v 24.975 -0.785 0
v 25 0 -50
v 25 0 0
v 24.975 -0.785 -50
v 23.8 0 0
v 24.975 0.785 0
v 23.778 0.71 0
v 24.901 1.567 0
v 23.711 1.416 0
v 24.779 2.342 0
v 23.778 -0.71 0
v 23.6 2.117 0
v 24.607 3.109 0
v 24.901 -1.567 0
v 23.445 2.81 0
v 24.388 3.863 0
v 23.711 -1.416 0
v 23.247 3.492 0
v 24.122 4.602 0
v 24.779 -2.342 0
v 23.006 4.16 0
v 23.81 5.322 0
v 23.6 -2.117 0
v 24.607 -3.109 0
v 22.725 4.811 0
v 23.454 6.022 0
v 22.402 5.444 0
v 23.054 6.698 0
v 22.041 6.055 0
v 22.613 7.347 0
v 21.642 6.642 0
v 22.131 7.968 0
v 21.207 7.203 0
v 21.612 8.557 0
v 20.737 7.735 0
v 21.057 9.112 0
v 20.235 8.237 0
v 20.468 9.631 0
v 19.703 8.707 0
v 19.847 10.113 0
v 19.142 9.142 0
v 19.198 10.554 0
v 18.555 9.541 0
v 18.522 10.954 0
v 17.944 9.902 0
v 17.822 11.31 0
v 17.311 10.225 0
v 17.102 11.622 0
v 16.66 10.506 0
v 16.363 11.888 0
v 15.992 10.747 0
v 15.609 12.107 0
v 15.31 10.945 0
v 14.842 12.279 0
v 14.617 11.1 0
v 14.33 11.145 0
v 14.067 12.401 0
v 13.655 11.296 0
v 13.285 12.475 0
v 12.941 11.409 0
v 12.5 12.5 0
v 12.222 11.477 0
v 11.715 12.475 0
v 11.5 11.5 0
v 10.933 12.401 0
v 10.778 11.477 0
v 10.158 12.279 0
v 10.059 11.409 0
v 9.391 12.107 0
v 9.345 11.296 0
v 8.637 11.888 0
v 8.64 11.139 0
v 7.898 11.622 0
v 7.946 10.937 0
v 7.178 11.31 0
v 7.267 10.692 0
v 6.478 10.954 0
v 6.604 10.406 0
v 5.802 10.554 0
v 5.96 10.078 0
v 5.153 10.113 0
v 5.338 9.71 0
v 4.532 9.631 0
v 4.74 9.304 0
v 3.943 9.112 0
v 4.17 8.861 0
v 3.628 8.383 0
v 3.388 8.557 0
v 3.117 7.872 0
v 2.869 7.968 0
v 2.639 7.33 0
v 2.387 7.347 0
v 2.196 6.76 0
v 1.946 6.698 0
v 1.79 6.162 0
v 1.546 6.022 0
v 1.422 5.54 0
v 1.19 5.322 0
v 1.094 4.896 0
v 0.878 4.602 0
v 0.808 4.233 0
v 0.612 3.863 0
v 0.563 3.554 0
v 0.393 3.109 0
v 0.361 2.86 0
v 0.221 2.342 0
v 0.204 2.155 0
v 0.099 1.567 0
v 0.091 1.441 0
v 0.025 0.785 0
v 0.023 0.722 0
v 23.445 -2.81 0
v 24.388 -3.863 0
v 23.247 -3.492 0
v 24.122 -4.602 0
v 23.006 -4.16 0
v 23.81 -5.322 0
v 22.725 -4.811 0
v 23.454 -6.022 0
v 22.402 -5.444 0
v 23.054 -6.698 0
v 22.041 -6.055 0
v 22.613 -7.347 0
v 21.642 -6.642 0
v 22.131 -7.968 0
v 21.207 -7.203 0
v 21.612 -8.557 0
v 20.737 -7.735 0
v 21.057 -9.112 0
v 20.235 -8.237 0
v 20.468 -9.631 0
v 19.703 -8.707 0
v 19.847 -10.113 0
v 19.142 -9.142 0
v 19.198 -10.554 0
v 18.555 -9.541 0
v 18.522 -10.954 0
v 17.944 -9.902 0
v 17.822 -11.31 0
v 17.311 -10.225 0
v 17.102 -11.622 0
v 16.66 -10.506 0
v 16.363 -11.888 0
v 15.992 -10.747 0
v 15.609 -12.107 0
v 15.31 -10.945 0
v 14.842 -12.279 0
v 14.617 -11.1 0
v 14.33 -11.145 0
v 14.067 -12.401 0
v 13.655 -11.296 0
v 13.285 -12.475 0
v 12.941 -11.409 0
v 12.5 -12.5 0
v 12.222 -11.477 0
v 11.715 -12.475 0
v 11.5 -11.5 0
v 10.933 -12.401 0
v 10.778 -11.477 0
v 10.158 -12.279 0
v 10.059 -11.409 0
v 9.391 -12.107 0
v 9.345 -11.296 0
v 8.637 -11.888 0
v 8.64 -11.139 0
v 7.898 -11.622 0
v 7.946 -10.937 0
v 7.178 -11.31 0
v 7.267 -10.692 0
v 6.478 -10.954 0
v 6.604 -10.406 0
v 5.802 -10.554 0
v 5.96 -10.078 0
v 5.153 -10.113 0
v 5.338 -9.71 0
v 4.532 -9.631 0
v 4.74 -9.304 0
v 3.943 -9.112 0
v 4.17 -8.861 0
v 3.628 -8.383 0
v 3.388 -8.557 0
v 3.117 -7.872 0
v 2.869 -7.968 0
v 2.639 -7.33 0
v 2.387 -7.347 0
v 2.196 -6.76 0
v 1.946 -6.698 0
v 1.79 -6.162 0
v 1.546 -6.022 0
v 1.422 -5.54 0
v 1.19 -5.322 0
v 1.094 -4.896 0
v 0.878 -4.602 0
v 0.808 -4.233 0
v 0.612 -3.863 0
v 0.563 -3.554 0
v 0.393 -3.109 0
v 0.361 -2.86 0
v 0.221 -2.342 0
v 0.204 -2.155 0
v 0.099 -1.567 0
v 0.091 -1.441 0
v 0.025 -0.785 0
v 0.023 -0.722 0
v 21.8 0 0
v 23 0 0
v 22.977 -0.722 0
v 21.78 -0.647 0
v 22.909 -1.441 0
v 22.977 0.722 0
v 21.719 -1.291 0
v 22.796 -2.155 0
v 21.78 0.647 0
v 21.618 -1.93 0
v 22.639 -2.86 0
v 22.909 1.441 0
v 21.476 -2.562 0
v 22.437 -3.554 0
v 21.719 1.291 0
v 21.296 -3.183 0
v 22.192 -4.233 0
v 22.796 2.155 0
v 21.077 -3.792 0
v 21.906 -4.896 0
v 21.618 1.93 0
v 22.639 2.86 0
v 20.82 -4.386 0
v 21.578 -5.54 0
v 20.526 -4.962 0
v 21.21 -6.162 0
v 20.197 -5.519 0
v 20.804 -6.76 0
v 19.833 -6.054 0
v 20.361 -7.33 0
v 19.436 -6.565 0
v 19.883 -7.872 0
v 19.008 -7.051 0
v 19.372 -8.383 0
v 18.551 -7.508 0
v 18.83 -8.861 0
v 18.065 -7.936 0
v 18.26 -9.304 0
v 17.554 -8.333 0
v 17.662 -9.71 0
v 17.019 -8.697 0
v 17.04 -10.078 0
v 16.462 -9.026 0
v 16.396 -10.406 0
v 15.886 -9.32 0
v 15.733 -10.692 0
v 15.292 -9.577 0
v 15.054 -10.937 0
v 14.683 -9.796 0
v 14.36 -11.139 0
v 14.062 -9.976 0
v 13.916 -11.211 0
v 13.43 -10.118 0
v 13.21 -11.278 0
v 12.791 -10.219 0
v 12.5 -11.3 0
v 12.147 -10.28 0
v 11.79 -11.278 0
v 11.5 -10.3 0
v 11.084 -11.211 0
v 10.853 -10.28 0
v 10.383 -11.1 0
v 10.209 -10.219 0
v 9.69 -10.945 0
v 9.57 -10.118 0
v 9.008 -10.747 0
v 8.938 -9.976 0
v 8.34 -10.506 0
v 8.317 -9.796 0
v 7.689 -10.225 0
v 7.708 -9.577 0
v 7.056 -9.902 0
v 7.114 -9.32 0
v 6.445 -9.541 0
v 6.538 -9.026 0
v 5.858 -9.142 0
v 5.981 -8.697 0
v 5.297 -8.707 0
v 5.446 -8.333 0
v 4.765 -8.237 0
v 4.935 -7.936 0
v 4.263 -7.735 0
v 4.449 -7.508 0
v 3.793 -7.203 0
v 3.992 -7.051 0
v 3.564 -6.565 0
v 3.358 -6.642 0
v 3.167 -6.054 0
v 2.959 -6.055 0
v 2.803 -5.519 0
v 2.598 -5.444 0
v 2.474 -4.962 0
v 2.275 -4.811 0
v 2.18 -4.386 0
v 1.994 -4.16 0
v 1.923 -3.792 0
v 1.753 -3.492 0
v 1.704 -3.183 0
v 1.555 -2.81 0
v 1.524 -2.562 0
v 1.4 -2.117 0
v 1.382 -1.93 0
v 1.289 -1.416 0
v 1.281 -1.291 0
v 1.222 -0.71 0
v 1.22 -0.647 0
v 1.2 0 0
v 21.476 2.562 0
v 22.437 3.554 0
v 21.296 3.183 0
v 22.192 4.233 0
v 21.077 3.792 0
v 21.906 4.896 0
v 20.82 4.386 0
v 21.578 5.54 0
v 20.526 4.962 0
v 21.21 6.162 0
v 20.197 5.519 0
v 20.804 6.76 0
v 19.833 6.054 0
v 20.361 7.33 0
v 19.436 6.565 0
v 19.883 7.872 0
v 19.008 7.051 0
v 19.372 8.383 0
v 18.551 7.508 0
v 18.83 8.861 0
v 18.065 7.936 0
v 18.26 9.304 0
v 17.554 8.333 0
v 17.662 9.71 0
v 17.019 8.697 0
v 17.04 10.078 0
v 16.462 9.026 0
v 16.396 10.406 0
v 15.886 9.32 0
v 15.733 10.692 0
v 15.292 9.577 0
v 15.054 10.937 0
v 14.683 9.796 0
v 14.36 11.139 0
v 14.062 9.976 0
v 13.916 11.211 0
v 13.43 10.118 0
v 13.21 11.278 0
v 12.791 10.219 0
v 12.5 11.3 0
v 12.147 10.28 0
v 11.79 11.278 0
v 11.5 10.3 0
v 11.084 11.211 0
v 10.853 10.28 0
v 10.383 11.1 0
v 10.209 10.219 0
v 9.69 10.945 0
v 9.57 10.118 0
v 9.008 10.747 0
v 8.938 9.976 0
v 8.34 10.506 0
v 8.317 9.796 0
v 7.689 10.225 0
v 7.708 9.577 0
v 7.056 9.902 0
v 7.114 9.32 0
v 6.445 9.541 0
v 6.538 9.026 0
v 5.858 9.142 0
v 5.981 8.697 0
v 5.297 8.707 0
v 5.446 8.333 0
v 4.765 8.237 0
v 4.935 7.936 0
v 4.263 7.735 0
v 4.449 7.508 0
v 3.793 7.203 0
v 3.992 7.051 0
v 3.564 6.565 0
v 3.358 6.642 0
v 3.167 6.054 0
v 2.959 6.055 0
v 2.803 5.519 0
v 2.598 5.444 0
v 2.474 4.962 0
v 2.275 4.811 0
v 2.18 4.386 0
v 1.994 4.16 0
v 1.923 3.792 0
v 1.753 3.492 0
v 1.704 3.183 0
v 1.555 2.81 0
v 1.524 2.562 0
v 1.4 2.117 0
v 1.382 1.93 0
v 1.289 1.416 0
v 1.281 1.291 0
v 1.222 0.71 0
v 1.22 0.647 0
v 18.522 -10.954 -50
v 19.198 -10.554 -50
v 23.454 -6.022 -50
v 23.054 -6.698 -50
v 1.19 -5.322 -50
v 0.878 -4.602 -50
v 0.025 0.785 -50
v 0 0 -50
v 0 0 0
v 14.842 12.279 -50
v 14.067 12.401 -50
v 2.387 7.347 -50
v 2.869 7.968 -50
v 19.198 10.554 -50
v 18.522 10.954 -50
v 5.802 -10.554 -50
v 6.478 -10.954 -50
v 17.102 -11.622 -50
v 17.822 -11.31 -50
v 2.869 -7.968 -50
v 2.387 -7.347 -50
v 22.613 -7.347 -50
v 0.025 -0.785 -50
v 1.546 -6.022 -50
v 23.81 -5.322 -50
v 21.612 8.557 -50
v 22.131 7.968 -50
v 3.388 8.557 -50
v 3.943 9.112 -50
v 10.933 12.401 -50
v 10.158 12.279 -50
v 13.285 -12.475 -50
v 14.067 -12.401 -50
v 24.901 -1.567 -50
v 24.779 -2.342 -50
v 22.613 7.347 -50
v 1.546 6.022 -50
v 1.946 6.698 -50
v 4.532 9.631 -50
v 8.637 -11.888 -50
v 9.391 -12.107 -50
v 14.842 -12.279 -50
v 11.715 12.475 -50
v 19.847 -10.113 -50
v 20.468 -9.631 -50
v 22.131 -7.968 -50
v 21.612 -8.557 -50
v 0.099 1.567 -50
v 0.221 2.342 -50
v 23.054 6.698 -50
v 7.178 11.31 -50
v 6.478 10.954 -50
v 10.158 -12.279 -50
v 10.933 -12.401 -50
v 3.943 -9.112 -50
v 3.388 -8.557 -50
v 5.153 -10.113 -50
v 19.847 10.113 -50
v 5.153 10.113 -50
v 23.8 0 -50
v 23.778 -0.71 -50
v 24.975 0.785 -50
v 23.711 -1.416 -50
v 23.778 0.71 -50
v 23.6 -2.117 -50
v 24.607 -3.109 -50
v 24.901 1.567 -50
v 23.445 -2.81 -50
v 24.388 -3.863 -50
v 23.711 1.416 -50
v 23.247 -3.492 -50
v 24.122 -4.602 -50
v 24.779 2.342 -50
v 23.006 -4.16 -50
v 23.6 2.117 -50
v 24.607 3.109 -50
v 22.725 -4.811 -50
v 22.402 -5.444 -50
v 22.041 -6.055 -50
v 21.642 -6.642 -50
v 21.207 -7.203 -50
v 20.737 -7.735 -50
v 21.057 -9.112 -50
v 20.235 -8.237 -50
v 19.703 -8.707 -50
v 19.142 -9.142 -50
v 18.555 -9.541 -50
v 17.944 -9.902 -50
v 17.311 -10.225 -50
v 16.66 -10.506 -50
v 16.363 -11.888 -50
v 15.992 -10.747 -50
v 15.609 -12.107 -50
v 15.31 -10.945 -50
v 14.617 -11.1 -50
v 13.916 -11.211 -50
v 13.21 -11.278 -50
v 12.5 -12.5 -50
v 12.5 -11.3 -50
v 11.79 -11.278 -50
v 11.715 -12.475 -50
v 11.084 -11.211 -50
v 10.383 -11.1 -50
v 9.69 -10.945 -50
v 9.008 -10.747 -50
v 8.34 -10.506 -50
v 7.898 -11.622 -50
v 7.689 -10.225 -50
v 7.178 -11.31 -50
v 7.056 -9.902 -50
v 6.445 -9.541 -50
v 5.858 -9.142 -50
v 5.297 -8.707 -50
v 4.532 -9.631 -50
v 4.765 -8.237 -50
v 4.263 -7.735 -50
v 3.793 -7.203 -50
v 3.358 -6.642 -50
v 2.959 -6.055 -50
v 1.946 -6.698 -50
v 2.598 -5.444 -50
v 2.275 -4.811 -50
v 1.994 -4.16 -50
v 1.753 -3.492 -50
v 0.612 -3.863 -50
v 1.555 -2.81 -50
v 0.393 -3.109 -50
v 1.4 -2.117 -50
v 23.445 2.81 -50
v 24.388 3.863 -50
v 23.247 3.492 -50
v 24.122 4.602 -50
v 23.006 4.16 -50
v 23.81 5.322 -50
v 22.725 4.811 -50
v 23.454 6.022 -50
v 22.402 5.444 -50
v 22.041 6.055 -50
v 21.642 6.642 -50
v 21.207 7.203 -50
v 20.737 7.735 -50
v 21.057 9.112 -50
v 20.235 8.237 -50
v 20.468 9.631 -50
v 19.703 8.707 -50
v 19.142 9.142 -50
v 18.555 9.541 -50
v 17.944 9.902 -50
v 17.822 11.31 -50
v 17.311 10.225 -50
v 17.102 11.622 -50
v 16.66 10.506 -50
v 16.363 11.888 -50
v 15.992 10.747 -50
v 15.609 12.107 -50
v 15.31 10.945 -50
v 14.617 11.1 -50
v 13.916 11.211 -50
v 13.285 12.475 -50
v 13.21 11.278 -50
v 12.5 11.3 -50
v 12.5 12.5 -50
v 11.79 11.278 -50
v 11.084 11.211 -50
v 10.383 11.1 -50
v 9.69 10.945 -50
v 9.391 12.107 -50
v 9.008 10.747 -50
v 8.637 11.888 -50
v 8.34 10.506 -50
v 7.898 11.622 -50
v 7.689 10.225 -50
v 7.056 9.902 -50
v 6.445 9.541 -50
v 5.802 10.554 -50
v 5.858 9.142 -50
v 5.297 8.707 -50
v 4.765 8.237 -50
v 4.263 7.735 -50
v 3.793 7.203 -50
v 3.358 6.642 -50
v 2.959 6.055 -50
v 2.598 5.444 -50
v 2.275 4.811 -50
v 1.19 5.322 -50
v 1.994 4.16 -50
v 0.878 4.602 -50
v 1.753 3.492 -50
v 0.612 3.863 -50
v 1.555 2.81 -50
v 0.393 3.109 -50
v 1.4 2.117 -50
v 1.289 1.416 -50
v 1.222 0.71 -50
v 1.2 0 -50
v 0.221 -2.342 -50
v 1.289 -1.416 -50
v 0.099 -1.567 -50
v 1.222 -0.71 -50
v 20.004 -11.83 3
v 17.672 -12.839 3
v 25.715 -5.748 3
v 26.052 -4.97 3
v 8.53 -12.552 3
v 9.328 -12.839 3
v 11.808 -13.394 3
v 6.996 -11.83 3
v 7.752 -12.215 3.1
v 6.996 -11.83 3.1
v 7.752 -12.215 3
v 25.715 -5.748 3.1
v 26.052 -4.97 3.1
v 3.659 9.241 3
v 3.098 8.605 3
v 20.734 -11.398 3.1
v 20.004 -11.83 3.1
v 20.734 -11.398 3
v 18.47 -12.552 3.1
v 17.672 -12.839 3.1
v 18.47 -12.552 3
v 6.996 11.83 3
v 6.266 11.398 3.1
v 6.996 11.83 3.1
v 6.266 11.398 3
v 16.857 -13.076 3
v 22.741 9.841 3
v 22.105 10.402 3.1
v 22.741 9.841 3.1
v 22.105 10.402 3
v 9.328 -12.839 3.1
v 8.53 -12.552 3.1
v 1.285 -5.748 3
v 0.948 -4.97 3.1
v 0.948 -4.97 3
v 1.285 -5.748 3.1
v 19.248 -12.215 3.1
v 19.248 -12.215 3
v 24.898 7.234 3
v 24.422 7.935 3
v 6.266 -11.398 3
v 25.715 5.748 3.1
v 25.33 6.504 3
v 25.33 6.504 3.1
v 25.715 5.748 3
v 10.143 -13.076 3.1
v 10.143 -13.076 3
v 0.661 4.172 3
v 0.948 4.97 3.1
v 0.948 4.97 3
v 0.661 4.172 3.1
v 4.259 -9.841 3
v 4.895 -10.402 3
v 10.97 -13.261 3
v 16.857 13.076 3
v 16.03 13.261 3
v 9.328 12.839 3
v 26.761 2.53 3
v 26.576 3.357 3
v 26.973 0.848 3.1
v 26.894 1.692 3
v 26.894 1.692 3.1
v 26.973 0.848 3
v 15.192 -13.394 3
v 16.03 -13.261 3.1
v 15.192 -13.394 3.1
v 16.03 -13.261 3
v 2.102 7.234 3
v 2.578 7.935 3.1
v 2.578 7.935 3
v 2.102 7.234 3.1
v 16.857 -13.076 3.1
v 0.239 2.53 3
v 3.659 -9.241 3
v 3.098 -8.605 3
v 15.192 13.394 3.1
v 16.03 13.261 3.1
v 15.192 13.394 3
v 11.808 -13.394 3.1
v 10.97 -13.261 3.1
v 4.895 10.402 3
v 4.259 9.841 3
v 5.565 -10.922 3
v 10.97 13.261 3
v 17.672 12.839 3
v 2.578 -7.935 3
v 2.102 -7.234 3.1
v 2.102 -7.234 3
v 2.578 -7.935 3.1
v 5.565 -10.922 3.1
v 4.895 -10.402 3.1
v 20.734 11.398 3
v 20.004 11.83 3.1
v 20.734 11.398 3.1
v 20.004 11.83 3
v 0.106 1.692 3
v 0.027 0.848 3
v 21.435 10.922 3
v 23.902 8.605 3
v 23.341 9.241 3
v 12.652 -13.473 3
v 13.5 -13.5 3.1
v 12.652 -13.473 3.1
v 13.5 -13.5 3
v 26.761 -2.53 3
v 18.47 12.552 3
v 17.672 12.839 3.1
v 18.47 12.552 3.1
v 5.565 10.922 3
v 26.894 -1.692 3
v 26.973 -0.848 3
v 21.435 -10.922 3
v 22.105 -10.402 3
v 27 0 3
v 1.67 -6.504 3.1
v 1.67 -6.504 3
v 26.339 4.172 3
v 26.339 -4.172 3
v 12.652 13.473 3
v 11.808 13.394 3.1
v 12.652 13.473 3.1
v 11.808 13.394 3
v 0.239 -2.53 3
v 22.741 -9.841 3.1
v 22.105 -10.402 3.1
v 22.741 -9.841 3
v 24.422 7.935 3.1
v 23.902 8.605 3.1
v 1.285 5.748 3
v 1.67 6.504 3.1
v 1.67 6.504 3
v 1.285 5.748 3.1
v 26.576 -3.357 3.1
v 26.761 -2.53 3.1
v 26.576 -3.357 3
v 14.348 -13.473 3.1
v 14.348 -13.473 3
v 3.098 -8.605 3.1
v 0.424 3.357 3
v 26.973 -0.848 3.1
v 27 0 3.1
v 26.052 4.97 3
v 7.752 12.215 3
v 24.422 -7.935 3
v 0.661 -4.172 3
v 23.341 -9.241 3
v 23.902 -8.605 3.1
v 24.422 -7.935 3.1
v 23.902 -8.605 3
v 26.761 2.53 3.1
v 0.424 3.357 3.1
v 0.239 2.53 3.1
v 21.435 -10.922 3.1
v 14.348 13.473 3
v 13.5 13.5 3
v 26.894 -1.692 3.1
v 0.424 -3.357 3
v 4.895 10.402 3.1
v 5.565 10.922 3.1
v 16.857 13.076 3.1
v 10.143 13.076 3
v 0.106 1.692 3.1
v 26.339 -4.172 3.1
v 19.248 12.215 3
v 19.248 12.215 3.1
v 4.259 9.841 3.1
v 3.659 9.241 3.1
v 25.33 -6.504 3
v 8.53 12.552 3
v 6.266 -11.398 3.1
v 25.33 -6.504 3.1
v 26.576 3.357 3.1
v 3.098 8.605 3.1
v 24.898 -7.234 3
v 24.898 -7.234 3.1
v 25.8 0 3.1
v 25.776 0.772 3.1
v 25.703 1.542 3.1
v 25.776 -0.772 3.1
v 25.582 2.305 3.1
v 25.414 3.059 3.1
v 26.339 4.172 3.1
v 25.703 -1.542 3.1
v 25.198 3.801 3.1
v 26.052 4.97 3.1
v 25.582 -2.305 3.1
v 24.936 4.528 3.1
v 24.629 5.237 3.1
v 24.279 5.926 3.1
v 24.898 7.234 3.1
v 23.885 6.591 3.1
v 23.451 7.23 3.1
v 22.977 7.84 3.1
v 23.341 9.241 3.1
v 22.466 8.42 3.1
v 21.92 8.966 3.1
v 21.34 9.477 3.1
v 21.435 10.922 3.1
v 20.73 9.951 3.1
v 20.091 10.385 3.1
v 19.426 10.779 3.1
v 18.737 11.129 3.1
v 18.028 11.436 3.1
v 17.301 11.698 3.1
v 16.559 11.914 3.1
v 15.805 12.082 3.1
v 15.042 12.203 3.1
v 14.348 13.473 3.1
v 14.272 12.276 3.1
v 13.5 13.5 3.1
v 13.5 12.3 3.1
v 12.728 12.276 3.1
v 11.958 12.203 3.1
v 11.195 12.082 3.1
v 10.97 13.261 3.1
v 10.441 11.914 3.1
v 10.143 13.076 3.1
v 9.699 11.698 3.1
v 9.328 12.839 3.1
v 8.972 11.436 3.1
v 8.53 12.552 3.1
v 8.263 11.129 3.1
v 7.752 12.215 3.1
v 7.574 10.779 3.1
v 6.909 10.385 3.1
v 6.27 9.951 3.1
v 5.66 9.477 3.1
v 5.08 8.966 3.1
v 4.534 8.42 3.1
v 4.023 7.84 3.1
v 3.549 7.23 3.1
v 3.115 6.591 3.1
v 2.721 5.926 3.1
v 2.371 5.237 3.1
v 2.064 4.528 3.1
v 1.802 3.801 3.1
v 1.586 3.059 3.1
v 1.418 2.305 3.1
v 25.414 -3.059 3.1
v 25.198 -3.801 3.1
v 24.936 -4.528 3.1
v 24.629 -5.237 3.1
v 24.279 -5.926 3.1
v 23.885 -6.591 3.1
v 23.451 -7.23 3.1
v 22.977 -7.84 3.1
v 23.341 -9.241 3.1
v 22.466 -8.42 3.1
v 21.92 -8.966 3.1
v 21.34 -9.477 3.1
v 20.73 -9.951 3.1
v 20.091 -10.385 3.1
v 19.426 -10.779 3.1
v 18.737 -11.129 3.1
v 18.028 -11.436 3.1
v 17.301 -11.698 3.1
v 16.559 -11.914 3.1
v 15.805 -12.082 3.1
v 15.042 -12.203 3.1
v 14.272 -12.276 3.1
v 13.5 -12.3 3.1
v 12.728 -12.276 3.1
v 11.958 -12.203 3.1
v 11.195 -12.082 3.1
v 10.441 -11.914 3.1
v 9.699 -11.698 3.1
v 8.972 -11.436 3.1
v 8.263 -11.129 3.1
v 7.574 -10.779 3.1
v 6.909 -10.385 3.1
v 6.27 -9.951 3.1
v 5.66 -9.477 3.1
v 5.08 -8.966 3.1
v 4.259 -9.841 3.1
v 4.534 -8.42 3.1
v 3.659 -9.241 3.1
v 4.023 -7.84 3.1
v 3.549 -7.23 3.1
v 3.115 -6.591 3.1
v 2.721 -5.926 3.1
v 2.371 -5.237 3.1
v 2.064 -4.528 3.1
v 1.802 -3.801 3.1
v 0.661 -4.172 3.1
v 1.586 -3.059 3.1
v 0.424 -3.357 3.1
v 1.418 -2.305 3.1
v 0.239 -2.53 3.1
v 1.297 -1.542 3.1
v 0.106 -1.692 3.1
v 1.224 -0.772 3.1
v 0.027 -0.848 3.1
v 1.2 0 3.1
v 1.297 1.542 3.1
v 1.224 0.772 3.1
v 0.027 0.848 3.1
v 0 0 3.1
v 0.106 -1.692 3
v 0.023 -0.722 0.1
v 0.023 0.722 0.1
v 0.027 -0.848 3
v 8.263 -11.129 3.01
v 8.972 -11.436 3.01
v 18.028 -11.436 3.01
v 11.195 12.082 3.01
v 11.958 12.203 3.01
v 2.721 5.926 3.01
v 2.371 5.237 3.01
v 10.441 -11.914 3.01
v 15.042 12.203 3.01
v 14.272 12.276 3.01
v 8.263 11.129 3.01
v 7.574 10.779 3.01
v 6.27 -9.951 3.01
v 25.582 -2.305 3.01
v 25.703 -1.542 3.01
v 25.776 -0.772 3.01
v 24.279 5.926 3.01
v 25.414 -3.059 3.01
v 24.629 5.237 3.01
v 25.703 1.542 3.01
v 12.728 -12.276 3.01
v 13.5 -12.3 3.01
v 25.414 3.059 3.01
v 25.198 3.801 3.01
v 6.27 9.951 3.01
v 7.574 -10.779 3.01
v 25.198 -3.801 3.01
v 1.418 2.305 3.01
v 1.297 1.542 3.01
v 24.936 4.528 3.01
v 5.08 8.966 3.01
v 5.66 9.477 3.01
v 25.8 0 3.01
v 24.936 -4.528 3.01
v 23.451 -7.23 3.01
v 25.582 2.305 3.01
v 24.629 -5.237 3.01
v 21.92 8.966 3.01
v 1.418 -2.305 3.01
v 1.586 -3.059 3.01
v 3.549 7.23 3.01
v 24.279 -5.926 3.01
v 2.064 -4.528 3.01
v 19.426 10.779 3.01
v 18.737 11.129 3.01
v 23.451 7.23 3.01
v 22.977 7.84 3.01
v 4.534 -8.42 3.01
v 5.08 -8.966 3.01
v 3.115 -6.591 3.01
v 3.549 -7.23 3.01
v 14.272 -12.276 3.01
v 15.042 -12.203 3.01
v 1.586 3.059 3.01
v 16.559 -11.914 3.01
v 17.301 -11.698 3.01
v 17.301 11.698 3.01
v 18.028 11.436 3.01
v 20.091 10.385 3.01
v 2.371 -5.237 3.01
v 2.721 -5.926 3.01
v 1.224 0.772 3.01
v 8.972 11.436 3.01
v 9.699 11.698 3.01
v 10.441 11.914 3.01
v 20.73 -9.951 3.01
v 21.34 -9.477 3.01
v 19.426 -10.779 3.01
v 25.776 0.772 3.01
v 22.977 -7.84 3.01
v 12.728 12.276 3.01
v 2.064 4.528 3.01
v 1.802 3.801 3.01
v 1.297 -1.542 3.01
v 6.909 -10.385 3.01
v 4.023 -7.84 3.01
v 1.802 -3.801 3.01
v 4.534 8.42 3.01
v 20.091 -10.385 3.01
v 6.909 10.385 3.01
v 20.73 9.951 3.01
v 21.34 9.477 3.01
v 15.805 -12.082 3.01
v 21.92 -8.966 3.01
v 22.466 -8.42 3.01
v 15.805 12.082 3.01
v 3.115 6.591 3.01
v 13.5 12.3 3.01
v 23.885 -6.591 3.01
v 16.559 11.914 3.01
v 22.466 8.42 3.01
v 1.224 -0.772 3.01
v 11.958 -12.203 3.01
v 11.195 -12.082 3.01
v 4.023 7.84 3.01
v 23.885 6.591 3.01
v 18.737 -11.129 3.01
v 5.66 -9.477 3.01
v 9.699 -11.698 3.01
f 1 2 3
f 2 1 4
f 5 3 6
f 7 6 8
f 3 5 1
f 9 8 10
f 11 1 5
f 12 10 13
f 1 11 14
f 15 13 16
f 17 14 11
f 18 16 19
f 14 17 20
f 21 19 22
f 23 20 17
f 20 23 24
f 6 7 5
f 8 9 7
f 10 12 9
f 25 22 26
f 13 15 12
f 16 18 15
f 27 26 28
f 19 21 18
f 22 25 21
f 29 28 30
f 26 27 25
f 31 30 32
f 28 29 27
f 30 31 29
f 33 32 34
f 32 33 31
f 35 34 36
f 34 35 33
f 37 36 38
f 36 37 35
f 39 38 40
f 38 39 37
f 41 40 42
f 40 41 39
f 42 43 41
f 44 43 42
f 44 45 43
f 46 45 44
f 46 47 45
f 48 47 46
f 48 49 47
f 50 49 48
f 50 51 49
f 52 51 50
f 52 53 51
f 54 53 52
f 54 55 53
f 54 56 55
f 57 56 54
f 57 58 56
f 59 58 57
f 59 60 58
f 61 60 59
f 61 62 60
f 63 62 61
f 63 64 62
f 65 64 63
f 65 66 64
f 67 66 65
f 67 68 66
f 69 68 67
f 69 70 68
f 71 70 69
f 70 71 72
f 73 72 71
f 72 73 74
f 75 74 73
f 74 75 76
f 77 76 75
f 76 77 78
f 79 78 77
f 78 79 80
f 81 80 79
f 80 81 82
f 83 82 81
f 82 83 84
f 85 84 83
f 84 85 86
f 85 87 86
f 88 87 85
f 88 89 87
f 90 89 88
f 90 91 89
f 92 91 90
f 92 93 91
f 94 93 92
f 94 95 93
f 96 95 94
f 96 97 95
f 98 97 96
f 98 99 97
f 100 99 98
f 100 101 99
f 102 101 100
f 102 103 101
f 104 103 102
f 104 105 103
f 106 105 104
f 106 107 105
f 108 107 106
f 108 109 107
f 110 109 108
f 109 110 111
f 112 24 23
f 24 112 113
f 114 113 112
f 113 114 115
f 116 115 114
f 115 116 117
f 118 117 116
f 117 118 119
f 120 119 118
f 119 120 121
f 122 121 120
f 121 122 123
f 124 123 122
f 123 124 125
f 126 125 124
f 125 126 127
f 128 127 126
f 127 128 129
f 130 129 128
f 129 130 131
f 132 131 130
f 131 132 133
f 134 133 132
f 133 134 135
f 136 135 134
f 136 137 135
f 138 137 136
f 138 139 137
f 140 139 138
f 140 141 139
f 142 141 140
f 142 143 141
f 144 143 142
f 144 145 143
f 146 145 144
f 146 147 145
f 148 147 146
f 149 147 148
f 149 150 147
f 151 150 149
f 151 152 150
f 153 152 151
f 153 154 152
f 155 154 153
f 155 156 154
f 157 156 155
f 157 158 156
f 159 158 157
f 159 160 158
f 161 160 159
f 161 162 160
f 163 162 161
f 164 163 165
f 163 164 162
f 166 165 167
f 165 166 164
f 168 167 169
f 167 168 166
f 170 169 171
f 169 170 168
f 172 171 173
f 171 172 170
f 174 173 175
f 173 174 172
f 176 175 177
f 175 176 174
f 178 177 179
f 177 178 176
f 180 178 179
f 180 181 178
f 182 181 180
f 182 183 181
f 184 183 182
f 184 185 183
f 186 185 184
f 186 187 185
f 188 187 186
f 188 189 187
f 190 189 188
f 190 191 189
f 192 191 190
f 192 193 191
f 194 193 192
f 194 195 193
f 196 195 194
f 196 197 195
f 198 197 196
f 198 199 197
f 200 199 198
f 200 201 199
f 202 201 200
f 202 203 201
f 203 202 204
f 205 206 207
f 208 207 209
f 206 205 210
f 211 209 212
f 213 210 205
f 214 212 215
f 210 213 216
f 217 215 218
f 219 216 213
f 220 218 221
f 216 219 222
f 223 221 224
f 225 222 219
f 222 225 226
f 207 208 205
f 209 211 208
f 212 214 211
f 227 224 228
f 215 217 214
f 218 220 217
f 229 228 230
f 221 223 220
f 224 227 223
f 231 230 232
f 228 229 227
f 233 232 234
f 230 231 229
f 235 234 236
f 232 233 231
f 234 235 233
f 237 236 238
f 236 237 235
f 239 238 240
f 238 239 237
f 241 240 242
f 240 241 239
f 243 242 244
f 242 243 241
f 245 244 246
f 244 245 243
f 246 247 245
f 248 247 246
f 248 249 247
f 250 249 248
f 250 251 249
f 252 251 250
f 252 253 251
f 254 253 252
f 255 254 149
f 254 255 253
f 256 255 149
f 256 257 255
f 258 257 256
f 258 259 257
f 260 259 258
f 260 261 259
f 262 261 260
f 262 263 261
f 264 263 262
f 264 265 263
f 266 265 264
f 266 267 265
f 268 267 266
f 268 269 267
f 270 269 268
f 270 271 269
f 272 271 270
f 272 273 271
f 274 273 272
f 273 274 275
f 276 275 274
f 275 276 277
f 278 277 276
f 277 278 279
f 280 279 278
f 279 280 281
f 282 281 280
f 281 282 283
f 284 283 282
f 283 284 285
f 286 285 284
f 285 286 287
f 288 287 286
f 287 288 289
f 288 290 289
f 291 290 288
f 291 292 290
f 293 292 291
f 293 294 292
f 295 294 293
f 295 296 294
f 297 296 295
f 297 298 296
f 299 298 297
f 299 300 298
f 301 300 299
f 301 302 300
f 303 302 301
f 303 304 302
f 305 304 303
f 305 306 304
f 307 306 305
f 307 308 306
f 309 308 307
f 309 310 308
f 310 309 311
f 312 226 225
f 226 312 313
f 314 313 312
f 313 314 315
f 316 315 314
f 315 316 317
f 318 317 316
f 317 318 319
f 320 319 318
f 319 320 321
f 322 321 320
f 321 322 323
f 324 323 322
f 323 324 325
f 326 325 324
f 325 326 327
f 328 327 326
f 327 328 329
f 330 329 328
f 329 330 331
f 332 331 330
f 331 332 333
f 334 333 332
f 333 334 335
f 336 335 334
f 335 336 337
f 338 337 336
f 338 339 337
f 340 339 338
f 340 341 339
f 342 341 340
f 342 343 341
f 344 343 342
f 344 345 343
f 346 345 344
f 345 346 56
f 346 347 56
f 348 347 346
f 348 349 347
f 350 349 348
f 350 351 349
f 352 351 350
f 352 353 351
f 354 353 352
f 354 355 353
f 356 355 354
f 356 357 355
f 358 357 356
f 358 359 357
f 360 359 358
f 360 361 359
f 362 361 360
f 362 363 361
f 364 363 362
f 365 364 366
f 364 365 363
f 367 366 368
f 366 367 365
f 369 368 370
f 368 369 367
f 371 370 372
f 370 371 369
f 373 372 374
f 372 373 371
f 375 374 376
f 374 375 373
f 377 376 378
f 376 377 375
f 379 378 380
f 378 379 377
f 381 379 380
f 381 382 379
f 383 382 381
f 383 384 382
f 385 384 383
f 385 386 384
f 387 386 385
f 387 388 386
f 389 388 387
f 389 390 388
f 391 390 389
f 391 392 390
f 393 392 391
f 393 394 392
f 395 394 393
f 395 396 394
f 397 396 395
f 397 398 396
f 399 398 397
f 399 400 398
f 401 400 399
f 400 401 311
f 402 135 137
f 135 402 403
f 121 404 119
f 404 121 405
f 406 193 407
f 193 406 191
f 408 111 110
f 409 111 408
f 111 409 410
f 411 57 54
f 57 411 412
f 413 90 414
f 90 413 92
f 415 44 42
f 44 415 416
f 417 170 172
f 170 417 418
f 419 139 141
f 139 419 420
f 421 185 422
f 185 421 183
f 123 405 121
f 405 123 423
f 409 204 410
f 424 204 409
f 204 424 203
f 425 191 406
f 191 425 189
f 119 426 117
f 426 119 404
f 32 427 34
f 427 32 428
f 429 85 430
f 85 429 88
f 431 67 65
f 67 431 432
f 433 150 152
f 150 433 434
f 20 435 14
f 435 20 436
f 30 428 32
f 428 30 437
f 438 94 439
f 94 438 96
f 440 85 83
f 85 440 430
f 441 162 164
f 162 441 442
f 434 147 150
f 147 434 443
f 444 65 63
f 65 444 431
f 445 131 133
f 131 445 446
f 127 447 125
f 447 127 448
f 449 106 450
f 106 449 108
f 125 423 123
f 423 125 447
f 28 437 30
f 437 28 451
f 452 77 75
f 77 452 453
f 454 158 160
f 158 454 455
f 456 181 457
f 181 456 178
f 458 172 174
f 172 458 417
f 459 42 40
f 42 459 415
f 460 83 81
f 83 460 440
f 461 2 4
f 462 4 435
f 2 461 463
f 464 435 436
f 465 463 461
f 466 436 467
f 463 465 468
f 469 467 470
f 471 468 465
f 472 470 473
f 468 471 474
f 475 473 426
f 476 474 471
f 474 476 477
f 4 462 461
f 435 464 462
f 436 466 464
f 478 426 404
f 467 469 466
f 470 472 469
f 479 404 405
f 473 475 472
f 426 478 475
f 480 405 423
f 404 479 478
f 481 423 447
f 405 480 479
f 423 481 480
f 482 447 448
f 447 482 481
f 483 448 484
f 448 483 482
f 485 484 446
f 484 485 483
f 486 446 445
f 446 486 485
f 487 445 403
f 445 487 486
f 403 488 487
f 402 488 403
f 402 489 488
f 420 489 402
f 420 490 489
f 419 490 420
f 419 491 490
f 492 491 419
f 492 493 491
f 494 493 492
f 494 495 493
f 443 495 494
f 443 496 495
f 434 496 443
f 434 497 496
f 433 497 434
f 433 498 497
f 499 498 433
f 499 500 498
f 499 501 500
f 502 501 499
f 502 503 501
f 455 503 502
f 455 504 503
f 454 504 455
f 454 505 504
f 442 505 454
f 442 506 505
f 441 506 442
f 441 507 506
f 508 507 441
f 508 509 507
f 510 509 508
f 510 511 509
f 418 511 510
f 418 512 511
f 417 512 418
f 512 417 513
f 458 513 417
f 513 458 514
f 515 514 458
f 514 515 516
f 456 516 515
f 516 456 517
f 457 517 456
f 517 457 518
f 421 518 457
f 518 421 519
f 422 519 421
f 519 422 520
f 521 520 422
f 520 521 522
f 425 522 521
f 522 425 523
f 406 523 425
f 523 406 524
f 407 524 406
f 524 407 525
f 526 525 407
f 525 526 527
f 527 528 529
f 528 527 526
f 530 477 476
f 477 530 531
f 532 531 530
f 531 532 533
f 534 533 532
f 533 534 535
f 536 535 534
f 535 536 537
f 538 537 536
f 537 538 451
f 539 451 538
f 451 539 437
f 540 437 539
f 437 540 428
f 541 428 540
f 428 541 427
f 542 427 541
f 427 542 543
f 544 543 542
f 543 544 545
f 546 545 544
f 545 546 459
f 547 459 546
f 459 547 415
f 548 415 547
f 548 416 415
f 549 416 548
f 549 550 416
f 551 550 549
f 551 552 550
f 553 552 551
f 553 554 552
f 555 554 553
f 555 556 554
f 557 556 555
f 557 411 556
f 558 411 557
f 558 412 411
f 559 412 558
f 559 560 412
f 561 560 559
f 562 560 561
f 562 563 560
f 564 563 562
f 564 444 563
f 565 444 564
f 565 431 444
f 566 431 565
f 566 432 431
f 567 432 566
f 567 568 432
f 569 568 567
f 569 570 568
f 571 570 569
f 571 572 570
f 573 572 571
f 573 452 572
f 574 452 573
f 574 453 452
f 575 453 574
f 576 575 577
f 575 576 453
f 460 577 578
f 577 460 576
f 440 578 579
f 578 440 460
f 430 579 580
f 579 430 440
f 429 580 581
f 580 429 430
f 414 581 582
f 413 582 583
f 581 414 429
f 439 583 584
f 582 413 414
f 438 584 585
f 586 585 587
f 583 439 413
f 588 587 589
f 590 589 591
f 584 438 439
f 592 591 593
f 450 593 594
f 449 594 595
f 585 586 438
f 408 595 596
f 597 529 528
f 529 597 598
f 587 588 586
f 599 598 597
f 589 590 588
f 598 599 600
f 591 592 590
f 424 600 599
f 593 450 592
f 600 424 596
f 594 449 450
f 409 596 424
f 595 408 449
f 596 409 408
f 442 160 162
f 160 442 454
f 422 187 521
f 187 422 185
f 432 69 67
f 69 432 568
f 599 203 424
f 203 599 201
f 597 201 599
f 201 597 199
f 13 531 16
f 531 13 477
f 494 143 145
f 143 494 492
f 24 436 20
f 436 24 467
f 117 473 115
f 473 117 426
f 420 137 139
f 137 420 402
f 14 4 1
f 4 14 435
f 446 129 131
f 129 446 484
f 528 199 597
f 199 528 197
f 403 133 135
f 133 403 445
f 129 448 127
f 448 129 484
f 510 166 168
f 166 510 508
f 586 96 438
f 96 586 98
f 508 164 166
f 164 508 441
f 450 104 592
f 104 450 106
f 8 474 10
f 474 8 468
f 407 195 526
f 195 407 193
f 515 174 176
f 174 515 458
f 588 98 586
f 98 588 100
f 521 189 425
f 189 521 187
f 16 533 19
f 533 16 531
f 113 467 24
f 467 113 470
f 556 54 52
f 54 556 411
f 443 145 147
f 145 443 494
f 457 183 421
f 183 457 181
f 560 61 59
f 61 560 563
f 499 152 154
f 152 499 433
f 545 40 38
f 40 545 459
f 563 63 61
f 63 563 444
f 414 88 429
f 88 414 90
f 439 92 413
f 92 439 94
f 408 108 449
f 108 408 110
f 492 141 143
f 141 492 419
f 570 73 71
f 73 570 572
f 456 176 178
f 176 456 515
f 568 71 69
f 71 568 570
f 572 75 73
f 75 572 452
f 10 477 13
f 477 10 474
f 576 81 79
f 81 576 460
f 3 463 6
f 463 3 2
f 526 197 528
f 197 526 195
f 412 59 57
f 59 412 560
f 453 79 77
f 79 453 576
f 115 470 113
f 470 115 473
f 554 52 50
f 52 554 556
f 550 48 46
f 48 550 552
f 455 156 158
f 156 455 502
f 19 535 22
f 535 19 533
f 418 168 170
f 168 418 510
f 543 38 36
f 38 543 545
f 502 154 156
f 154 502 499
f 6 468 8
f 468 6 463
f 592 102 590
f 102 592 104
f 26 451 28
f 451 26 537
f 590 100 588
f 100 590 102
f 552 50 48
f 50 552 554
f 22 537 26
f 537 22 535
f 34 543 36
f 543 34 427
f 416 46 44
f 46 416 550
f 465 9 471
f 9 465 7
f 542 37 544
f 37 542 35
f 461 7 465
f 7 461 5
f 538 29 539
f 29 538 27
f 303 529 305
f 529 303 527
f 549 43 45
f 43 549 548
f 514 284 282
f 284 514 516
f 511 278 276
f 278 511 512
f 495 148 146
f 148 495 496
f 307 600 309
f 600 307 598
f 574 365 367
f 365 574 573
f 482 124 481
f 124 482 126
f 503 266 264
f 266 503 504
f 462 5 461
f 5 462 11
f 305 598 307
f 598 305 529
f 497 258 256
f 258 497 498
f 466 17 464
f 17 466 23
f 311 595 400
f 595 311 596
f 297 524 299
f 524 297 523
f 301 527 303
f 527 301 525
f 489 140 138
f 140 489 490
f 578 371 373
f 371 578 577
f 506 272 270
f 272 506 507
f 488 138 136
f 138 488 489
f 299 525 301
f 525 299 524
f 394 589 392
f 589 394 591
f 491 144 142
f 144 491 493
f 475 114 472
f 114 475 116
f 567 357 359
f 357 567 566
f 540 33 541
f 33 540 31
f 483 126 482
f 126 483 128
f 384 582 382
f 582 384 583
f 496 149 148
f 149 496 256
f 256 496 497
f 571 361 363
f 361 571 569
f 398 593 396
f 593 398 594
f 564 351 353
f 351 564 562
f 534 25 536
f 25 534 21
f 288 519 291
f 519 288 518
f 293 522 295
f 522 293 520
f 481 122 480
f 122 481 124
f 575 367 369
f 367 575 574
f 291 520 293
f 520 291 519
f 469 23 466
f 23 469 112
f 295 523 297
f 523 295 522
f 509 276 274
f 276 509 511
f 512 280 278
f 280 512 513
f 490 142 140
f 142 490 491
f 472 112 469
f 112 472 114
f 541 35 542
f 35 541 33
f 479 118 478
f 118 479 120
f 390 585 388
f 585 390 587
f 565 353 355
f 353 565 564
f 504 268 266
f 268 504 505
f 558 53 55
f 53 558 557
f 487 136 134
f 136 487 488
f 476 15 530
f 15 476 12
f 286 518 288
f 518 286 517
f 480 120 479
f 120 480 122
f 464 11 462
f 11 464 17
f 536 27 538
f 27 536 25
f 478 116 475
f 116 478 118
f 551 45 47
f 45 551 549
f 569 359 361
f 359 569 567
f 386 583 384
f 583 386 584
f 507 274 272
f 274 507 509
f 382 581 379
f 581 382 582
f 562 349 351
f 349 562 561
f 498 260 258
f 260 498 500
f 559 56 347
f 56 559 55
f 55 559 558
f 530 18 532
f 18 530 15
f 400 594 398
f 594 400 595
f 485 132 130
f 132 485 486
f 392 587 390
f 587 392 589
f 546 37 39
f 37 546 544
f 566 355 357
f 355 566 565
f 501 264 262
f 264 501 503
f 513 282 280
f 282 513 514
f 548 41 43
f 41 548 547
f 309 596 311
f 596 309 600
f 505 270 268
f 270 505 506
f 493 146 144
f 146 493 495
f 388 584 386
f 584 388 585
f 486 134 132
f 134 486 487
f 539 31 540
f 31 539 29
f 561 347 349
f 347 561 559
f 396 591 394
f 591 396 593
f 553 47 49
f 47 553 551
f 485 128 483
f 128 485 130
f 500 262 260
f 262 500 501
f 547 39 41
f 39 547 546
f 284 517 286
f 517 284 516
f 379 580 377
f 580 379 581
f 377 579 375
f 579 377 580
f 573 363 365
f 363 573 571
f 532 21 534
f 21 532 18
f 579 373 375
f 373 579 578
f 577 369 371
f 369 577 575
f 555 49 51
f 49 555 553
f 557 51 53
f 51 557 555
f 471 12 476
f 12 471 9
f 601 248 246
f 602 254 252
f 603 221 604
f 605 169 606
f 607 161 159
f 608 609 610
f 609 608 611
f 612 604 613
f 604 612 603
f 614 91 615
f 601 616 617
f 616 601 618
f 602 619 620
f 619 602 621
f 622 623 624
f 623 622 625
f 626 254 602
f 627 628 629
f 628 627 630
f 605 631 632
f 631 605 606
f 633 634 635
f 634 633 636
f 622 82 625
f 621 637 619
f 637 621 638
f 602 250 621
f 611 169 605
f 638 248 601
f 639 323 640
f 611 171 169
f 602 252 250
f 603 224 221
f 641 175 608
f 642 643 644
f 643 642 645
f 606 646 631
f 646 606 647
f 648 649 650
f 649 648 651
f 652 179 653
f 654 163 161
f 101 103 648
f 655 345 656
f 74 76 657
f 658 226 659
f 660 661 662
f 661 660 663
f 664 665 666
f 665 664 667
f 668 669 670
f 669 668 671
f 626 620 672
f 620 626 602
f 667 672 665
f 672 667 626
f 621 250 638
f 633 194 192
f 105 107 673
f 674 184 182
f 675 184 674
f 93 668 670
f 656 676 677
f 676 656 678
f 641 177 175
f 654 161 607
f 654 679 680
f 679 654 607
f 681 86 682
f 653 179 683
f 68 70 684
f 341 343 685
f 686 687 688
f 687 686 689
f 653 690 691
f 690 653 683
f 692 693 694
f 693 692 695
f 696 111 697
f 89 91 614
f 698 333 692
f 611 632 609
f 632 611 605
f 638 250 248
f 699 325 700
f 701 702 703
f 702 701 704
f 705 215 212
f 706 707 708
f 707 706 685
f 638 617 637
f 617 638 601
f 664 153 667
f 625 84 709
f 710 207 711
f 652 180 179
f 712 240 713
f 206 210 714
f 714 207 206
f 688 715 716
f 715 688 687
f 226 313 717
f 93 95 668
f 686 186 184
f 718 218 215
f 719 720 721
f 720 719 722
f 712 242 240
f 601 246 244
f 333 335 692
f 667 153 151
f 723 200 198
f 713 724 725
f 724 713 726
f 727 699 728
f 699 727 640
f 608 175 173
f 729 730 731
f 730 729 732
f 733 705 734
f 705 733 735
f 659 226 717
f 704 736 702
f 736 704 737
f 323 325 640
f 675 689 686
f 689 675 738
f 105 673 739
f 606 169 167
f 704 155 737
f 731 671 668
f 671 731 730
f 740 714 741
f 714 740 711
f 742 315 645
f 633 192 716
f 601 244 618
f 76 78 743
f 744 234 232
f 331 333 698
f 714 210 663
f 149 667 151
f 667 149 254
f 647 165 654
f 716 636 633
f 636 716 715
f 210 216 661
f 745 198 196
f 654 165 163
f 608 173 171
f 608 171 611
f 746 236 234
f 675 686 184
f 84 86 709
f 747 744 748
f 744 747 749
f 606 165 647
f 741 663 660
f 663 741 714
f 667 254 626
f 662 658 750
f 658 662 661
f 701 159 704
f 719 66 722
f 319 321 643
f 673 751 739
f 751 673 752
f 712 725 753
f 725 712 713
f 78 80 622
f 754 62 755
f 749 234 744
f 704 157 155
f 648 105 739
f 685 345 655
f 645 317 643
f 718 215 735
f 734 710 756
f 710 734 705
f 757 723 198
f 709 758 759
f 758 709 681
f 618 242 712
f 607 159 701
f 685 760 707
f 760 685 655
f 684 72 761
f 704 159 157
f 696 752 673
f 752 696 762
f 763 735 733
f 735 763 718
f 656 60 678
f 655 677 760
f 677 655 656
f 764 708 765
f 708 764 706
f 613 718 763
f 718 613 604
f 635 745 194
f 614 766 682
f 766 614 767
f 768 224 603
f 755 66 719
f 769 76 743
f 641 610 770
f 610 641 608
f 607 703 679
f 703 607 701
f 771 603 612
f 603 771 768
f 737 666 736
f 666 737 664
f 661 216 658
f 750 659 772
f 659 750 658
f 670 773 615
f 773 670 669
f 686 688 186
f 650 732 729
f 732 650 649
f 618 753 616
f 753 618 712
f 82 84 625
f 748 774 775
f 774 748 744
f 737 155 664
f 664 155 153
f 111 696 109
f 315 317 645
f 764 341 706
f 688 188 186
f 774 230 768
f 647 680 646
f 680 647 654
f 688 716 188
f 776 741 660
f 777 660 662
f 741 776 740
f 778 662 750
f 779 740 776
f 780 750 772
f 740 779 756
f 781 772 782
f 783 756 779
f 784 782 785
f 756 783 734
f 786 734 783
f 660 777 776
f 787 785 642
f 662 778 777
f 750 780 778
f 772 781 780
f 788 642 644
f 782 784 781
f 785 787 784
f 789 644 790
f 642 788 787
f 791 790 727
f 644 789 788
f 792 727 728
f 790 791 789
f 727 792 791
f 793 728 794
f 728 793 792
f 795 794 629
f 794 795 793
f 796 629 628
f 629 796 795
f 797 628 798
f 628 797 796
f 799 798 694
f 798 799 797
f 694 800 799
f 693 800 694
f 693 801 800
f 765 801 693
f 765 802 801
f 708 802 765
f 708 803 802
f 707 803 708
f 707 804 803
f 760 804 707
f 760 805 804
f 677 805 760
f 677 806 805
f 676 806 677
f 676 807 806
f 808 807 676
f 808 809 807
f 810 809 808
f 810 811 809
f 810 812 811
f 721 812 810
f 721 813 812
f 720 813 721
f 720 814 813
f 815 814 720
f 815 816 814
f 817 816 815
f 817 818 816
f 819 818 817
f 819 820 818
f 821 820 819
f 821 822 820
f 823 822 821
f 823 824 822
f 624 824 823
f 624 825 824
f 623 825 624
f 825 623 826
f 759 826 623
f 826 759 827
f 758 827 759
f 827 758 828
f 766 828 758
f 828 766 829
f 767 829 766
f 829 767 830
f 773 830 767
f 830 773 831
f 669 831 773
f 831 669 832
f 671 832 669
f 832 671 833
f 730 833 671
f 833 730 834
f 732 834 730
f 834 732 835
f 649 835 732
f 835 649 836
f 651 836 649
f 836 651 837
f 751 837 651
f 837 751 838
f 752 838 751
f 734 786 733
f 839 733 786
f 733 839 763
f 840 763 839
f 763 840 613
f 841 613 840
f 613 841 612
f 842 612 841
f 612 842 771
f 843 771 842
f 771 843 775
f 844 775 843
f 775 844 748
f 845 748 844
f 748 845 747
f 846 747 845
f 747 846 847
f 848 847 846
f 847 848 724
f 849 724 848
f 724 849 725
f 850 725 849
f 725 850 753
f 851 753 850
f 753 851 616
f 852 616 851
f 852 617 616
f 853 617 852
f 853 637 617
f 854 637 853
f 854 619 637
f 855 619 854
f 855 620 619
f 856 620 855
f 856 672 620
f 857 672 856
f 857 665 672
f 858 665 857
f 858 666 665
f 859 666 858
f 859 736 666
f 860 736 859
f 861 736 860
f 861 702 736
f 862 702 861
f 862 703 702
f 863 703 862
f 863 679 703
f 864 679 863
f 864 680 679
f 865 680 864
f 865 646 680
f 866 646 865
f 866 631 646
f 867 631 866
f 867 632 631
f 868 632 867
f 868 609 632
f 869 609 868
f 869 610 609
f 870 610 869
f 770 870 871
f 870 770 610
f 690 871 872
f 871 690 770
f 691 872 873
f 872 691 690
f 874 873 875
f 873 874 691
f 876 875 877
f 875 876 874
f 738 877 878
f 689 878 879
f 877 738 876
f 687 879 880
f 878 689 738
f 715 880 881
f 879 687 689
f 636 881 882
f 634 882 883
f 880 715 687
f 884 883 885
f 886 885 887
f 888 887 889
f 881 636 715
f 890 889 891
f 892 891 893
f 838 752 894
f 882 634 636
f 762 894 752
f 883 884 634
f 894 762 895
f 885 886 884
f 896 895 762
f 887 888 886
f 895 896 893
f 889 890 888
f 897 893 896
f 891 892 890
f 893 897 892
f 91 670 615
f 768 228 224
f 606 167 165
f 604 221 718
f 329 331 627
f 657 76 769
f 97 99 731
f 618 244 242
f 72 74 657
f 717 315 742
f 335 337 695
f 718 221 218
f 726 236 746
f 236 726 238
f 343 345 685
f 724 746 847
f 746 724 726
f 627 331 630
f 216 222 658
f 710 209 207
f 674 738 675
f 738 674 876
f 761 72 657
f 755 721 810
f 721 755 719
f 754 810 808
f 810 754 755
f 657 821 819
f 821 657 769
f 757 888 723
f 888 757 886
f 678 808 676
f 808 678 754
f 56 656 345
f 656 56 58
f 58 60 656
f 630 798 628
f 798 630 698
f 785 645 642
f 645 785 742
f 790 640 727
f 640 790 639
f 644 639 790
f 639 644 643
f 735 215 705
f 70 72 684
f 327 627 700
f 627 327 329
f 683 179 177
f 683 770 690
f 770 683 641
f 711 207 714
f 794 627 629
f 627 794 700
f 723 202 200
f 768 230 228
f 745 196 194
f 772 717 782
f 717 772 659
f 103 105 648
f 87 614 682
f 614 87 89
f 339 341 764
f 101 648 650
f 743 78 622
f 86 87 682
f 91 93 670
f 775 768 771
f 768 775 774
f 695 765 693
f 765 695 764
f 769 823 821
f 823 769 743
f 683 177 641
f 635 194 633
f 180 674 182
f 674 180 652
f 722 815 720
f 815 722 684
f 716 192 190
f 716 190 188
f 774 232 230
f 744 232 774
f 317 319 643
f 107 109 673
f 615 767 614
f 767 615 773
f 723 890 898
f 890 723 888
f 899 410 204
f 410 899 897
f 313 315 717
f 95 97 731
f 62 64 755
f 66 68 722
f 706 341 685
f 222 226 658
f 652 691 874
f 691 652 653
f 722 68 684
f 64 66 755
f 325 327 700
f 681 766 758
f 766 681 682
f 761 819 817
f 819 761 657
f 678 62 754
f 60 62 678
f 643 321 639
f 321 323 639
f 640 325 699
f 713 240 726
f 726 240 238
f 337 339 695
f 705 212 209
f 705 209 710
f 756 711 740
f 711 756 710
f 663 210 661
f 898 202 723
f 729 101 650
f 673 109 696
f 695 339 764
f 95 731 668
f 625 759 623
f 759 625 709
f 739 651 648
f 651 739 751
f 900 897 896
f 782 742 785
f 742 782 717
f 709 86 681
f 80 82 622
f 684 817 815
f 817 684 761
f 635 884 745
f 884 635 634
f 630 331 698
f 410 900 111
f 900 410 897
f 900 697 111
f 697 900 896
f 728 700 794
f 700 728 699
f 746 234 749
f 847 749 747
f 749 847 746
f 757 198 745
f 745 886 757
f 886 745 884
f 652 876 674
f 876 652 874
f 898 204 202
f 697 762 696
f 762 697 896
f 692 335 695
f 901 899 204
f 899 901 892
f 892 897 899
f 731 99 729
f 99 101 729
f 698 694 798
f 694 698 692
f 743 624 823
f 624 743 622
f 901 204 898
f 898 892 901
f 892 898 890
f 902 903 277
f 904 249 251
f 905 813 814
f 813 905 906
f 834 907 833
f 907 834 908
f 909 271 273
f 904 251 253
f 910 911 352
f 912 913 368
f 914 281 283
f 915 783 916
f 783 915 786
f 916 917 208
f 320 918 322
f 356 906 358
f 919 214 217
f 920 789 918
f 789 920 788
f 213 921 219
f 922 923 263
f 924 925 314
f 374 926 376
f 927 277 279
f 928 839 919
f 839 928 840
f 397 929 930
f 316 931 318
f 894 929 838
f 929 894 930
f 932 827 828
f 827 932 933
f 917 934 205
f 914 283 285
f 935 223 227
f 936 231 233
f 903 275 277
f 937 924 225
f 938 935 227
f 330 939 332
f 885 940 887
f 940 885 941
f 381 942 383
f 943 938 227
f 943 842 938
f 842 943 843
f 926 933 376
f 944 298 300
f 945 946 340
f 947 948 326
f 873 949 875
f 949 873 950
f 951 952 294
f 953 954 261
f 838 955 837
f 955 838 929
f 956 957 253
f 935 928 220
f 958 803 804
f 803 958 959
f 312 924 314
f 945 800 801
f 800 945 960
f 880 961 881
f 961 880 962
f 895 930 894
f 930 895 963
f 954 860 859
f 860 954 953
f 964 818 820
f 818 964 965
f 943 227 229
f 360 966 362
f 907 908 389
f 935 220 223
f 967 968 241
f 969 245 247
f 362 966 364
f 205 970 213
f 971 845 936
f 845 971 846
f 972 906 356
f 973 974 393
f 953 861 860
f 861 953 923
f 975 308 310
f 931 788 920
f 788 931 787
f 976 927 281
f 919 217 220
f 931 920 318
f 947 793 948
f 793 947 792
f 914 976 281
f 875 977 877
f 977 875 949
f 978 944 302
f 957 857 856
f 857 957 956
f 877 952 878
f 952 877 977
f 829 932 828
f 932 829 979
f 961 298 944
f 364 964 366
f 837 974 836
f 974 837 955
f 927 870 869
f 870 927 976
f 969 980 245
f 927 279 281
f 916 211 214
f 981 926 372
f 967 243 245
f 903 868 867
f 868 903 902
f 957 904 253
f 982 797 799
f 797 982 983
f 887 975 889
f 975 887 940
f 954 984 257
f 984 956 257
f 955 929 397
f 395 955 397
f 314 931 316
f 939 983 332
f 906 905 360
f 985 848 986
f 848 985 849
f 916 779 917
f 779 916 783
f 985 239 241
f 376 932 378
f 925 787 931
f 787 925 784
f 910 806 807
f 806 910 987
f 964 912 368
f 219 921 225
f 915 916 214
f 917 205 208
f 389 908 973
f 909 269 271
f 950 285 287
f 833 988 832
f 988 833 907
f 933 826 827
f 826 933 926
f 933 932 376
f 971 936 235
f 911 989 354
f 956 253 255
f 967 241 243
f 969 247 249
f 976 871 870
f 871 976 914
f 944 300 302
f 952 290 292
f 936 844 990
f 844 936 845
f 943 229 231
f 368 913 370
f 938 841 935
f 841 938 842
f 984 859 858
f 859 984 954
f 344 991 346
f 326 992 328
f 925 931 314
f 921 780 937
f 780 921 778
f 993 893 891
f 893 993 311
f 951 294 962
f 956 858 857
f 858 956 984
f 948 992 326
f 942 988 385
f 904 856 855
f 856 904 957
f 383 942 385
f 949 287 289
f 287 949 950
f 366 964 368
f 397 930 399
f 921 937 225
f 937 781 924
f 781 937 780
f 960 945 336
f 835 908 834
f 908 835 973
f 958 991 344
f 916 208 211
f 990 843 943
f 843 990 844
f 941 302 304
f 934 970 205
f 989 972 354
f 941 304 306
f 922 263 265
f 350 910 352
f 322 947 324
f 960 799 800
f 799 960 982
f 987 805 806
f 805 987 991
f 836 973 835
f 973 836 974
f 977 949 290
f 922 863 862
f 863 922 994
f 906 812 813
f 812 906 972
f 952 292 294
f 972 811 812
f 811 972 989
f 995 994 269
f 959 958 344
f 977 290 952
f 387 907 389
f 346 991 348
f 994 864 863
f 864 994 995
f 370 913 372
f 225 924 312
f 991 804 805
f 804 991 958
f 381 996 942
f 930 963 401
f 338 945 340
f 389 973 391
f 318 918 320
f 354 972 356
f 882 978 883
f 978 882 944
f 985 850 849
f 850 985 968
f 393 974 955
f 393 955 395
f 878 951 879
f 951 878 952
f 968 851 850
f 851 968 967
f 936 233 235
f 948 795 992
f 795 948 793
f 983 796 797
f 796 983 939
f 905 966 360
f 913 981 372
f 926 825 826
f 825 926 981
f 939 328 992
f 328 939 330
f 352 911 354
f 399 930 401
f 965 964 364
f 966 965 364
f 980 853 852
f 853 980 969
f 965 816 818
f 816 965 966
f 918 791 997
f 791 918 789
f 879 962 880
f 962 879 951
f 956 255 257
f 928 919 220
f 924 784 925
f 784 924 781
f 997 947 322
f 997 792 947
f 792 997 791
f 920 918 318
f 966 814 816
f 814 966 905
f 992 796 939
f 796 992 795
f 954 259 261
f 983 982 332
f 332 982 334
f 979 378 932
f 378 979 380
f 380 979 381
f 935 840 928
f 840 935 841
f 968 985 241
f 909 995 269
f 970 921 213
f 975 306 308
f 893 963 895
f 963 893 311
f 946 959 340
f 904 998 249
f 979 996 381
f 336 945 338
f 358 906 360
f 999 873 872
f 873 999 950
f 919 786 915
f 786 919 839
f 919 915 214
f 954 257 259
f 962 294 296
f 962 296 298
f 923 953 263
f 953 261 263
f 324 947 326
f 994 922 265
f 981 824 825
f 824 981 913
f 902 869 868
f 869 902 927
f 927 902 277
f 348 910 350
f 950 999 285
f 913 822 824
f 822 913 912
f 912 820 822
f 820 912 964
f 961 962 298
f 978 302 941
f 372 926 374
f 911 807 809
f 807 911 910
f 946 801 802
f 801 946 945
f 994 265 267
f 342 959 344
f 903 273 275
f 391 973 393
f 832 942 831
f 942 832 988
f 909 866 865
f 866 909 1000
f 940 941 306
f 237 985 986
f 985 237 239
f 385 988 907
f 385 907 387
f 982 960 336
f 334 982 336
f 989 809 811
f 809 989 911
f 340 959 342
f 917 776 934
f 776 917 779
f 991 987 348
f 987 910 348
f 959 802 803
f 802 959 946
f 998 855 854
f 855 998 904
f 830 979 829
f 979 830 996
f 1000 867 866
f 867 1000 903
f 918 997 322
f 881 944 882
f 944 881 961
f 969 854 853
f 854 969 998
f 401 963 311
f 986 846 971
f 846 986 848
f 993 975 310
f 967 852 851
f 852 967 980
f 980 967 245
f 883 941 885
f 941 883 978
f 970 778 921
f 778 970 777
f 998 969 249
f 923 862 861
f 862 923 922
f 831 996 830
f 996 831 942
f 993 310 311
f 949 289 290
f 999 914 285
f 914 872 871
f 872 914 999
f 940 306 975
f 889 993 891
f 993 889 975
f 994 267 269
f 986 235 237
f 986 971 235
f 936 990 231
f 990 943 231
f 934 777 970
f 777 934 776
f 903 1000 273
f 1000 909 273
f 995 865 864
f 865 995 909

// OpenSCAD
RS = 25/2; // mm - outer size of start (fits the car)
RE = 28; // mm - outer size of the end
ROFS = 1.2; //mm - wall thickness 

H1=50;
H2=70;
$fn=100;


module cylinder2(r, tx=0, roty=0, h=0.1) {
    rotate([0,roty,0]) 
        linear_extrude(height=h) 
            translate([tx,0])
                circle(r=r);
}


module cylinder3(rs, re, h, ofs=ROFS, ofe=ROFS, roty=0){
    difference(){
        //outer wall
        hull(){
            cylinder2(rs, tx=rs);
            translate([0,0,h]) cylinder2(re,tx=re, roty=roty);
        }
        // innter wall
        hull(){
            cylinder2(rs-ofs, tx=rs);
            translate([0,0,h+0.01]) cylinder2(re-ofe,tx=re, roty=roty);
        }
    }

}

module funel(){
    // bottom part
    translate([0,0,-H1]) 
    difference(){
        cylinder2(RS, tx=RS, h=H1);
        cylinder2(RS-ROFS, tx=RS, h=H1);
    }

    // filter holder
    //translate([0,0,-2]) 
    cylinder3(RS-1,RS+1,3, ofe=ROFS);
    //translate([0,0,+2])
    //cylinder3(RS+1,RS+1,1, ofs=ROFS, ofe=ROFS+1.4);
    //}

    // funel
    //cylinder3(RS,RE, H2, roty=30);
}


module filter(){
    hf = 1.2;
    rf = RS-ROFS-0.4; // <=RS
    
    
    //rim
    color("red")
    translate([RS,0,0])
    difference(){
        cylinder(r=rf,h=hf+0.8);
        cylinder(r=rf-1, h=hf+0.8);
    }

    
    difference(){
        //pattern
        translate([0,-RS,0])
        union(){
            for (x =[0:4:2*RS]){
                translate([0,x,0]) cube([2*RS,1,hf]);
                translate([x,0,0]) cube([1,2*RS,hf]);
            }
        }

        //mask
        difference(){
            translate([0,-RS,0]) cube([2*RS,2*RS,hf]);
            translate([RS,0,0]) cylinder(r=rf,h=hf);
        }
    }
}

funel();
//translate([0,0,-2])
//filter();
